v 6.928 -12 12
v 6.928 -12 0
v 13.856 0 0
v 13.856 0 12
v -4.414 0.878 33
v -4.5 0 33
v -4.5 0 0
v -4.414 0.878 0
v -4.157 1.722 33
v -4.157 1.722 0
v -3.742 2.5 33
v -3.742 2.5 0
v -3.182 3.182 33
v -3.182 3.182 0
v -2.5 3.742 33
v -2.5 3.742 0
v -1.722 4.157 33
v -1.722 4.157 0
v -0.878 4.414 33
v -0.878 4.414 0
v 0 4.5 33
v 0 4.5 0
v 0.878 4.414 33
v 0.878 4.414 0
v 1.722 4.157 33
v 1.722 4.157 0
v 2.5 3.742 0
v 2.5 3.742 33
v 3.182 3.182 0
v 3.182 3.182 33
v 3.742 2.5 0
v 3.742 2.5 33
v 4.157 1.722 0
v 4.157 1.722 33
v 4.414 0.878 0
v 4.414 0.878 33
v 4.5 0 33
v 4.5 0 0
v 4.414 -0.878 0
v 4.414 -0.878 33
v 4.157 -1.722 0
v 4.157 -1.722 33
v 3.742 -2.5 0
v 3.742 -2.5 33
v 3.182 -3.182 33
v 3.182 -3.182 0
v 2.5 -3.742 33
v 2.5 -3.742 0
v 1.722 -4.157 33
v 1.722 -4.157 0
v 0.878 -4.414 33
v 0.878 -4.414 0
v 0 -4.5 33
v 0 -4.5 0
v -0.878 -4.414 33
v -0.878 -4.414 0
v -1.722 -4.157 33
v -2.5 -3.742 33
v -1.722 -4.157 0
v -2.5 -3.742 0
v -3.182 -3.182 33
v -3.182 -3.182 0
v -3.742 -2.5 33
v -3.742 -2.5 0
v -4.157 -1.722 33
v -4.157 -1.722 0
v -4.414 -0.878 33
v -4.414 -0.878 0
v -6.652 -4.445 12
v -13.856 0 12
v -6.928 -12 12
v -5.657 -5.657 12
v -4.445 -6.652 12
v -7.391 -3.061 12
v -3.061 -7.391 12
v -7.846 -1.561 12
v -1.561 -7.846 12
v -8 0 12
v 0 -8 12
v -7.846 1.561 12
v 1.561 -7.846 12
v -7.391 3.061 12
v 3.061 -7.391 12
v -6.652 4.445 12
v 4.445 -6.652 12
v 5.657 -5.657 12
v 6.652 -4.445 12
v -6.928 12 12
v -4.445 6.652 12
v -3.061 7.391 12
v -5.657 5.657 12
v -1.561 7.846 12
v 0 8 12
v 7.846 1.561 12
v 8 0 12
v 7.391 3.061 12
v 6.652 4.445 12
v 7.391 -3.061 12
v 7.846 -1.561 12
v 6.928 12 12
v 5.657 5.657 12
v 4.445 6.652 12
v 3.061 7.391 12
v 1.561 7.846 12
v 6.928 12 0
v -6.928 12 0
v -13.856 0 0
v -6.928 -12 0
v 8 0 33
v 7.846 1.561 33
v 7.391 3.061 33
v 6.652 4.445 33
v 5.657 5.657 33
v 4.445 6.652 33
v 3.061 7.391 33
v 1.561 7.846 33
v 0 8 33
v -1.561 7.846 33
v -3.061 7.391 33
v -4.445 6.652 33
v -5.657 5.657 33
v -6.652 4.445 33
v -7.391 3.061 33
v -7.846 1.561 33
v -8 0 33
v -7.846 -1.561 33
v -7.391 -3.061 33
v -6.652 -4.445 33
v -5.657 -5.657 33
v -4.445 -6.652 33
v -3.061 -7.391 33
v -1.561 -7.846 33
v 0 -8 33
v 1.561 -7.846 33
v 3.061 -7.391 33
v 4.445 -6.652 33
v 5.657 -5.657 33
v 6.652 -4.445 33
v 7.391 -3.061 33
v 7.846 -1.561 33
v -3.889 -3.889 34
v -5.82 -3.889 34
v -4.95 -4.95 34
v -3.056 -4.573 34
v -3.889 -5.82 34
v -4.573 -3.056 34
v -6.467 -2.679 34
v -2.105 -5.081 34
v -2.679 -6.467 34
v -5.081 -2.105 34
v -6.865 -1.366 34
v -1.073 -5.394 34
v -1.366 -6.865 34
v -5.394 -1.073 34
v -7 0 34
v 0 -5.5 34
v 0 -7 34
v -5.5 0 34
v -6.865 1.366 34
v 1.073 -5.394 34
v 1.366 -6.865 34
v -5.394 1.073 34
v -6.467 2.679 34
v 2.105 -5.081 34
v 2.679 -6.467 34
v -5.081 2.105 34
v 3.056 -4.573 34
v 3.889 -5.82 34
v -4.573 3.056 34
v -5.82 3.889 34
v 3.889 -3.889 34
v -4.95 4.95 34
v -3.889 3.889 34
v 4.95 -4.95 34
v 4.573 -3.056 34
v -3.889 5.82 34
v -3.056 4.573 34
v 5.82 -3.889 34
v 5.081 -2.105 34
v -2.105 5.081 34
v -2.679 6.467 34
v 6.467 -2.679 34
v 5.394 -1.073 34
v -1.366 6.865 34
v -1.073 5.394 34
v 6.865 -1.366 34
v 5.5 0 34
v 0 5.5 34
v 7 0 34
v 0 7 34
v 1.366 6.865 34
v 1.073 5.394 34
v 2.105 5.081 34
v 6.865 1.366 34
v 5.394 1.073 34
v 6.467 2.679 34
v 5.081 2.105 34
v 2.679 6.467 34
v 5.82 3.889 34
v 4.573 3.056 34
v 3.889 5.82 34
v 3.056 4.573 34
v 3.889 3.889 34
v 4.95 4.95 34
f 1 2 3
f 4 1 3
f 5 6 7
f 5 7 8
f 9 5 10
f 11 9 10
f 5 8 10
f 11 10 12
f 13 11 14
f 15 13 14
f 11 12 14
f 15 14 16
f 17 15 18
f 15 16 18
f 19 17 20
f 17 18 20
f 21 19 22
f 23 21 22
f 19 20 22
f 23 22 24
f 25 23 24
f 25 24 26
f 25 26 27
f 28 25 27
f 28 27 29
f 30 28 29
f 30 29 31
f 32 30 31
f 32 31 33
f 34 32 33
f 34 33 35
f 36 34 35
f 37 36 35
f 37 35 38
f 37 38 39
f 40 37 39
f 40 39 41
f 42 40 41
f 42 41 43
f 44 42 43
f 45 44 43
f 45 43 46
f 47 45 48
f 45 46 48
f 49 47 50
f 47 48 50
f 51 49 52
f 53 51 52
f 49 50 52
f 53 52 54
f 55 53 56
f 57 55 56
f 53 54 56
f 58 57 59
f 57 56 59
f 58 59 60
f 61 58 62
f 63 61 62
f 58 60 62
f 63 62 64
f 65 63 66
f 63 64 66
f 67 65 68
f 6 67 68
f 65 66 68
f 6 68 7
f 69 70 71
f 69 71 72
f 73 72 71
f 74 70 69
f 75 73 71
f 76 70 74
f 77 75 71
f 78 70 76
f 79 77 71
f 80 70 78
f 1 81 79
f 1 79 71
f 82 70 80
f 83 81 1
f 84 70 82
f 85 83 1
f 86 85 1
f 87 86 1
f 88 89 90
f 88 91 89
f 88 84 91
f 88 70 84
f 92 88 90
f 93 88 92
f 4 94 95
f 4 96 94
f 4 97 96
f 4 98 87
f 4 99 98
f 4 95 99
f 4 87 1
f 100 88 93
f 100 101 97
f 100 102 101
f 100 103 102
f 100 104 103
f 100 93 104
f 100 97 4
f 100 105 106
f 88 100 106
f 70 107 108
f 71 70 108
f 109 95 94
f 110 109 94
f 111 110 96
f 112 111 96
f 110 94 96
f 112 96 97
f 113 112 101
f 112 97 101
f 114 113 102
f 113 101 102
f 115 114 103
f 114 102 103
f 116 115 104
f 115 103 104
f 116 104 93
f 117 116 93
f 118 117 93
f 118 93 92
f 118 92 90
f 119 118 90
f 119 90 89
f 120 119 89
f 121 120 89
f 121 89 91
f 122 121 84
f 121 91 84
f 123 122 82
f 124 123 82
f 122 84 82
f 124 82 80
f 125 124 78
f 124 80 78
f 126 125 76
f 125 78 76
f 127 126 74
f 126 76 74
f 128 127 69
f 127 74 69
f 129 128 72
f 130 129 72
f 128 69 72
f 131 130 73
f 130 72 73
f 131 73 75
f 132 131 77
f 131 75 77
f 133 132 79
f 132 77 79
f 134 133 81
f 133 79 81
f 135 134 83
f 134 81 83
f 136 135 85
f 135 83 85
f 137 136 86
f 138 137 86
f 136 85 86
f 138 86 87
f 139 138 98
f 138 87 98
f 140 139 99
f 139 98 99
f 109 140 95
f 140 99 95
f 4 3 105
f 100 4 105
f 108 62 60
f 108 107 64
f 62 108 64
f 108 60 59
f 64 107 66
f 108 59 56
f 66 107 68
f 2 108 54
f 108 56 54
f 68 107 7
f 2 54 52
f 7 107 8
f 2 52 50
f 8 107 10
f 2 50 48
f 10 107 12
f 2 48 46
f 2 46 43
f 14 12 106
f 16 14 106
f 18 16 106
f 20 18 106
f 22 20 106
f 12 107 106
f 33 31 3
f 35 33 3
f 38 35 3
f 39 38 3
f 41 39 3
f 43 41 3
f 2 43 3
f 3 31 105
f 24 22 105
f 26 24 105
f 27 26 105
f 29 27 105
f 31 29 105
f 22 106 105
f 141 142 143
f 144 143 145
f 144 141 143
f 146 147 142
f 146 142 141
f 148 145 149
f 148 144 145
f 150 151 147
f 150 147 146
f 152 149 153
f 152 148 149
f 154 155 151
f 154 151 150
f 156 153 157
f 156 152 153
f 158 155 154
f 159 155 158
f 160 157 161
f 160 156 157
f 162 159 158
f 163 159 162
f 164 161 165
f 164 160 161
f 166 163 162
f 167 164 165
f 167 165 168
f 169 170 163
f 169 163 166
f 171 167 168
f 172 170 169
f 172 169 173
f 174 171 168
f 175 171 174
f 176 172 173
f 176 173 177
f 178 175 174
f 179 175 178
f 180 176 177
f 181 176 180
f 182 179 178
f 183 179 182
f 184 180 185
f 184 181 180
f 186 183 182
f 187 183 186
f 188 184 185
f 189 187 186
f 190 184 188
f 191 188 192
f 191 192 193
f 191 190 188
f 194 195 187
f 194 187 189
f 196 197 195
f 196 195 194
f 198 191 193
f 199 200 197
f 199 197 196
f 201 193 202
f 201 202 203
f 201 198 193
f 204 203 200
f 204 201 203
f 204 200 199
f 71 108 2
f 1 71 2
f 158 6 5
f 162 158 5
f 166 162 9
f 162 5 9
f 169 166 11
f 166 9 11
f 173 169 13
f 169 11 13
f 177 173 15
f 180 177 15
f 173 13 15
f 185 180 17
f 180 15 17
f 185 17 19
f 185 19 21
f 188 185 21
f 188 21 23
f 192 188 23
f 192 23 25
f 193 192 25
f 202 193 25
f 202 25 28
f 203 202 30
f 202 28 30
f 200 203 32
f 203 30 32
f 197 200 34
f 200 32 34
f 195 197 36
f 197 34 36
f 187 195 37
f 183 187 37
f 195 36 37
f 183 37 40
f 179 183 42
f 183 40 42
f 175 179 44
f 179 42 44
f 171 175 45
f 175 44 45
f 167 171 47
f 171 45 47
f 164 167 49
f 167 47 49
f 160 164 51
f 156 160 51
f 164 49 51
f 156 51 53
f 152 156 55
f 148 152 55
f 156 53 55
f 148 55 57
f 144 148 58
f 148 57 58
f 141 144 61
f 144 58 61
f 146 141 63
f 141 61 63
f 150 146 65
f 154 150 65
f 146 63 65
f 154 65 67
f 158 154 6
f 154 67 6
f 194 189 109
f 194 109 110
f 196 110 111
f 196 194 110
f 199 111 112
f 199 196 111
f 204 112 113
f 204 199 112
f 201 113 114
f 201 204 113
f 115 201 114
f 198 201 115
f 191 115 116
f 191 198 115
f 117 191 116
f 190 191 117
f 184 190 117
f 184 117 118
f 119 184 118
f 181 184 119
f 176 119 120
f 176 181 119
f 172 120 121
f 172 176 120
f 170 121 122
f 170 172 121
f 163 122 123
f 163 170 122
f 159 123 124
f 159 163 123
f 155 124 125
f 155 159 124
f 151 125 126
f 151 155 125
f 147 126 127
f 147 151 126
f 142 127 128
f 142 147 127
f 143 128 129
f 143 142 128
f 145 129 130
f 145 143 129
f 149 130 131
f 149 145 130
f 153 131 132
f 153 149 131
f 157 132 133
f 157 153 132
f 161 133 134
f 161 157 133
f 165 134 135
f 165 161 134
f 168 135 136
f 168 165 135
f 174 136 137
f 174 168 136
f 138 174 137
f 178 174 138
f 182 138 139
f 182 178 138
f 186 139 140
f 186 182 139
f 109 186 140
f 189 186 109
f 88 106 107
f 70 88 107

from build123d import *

# Parameters (mm, degrees)
EXTRUDE_1_DEPTH     = 12
SKETCH_2_R          = 8
EXTRUDE_2_DEPTH     = 22
SKETCH_3_R          = 4.5
CUT_EXTRUDE_3_DEPTH = 39.626415832
CHAMFER_1_SIZE      = 1
CHAMFER_2_SIZE      = 1


with BuildPart() as part:
    # 草图1 → 拉伸1 (new body)
    with BuildSketch(Plane.XY):
        Polygon((-6.92820323, -12), (6.92820323, -12), (13.856406461, 0), (6.92820323, 12), (-6.92820323, 12), (-13.856406461, 0), align=None)
    extrude(amount=EXTRUDE_1_DEPTH)

    # 草图2 → 拉伸2 (add)
    with BuildSketch(Plane.XY.offset(12)):
        Circle(SKETCH_2_R)
    extrude(amount=EXTRUDE_2_DEPTH)

    # 草图3 → 拉伸3 (cut, through all)
    with BuildSketch(Plane(origin=(0, 0, 0), x_dir=(-1, 0, 0), z_dir=(0, 0, -1))):
        Circle(SKETCH_3_R)
    extrude(amount=-CUT_EXTRUDE_3_DEPTH, mode=Mode.SUBTRACT)

    # 倒角1
    chamfer_1_edges = [part.edges().sort_by_distance(p)[0] for p in [
        (-8, 0, 34),
    ]]
    chamfer(chamfer_1_edges, length=CHAMFER_1_SIZE)

    # 倒角2
    chamfer_2_edges = [part.edges().sort_by_distance(p)[0] for p in [
        (4.5, 0, 34),
    ]]
    chamfer(chamfer_2_edges, length=CHAMFER_2_SIZE)


solid = part.part
